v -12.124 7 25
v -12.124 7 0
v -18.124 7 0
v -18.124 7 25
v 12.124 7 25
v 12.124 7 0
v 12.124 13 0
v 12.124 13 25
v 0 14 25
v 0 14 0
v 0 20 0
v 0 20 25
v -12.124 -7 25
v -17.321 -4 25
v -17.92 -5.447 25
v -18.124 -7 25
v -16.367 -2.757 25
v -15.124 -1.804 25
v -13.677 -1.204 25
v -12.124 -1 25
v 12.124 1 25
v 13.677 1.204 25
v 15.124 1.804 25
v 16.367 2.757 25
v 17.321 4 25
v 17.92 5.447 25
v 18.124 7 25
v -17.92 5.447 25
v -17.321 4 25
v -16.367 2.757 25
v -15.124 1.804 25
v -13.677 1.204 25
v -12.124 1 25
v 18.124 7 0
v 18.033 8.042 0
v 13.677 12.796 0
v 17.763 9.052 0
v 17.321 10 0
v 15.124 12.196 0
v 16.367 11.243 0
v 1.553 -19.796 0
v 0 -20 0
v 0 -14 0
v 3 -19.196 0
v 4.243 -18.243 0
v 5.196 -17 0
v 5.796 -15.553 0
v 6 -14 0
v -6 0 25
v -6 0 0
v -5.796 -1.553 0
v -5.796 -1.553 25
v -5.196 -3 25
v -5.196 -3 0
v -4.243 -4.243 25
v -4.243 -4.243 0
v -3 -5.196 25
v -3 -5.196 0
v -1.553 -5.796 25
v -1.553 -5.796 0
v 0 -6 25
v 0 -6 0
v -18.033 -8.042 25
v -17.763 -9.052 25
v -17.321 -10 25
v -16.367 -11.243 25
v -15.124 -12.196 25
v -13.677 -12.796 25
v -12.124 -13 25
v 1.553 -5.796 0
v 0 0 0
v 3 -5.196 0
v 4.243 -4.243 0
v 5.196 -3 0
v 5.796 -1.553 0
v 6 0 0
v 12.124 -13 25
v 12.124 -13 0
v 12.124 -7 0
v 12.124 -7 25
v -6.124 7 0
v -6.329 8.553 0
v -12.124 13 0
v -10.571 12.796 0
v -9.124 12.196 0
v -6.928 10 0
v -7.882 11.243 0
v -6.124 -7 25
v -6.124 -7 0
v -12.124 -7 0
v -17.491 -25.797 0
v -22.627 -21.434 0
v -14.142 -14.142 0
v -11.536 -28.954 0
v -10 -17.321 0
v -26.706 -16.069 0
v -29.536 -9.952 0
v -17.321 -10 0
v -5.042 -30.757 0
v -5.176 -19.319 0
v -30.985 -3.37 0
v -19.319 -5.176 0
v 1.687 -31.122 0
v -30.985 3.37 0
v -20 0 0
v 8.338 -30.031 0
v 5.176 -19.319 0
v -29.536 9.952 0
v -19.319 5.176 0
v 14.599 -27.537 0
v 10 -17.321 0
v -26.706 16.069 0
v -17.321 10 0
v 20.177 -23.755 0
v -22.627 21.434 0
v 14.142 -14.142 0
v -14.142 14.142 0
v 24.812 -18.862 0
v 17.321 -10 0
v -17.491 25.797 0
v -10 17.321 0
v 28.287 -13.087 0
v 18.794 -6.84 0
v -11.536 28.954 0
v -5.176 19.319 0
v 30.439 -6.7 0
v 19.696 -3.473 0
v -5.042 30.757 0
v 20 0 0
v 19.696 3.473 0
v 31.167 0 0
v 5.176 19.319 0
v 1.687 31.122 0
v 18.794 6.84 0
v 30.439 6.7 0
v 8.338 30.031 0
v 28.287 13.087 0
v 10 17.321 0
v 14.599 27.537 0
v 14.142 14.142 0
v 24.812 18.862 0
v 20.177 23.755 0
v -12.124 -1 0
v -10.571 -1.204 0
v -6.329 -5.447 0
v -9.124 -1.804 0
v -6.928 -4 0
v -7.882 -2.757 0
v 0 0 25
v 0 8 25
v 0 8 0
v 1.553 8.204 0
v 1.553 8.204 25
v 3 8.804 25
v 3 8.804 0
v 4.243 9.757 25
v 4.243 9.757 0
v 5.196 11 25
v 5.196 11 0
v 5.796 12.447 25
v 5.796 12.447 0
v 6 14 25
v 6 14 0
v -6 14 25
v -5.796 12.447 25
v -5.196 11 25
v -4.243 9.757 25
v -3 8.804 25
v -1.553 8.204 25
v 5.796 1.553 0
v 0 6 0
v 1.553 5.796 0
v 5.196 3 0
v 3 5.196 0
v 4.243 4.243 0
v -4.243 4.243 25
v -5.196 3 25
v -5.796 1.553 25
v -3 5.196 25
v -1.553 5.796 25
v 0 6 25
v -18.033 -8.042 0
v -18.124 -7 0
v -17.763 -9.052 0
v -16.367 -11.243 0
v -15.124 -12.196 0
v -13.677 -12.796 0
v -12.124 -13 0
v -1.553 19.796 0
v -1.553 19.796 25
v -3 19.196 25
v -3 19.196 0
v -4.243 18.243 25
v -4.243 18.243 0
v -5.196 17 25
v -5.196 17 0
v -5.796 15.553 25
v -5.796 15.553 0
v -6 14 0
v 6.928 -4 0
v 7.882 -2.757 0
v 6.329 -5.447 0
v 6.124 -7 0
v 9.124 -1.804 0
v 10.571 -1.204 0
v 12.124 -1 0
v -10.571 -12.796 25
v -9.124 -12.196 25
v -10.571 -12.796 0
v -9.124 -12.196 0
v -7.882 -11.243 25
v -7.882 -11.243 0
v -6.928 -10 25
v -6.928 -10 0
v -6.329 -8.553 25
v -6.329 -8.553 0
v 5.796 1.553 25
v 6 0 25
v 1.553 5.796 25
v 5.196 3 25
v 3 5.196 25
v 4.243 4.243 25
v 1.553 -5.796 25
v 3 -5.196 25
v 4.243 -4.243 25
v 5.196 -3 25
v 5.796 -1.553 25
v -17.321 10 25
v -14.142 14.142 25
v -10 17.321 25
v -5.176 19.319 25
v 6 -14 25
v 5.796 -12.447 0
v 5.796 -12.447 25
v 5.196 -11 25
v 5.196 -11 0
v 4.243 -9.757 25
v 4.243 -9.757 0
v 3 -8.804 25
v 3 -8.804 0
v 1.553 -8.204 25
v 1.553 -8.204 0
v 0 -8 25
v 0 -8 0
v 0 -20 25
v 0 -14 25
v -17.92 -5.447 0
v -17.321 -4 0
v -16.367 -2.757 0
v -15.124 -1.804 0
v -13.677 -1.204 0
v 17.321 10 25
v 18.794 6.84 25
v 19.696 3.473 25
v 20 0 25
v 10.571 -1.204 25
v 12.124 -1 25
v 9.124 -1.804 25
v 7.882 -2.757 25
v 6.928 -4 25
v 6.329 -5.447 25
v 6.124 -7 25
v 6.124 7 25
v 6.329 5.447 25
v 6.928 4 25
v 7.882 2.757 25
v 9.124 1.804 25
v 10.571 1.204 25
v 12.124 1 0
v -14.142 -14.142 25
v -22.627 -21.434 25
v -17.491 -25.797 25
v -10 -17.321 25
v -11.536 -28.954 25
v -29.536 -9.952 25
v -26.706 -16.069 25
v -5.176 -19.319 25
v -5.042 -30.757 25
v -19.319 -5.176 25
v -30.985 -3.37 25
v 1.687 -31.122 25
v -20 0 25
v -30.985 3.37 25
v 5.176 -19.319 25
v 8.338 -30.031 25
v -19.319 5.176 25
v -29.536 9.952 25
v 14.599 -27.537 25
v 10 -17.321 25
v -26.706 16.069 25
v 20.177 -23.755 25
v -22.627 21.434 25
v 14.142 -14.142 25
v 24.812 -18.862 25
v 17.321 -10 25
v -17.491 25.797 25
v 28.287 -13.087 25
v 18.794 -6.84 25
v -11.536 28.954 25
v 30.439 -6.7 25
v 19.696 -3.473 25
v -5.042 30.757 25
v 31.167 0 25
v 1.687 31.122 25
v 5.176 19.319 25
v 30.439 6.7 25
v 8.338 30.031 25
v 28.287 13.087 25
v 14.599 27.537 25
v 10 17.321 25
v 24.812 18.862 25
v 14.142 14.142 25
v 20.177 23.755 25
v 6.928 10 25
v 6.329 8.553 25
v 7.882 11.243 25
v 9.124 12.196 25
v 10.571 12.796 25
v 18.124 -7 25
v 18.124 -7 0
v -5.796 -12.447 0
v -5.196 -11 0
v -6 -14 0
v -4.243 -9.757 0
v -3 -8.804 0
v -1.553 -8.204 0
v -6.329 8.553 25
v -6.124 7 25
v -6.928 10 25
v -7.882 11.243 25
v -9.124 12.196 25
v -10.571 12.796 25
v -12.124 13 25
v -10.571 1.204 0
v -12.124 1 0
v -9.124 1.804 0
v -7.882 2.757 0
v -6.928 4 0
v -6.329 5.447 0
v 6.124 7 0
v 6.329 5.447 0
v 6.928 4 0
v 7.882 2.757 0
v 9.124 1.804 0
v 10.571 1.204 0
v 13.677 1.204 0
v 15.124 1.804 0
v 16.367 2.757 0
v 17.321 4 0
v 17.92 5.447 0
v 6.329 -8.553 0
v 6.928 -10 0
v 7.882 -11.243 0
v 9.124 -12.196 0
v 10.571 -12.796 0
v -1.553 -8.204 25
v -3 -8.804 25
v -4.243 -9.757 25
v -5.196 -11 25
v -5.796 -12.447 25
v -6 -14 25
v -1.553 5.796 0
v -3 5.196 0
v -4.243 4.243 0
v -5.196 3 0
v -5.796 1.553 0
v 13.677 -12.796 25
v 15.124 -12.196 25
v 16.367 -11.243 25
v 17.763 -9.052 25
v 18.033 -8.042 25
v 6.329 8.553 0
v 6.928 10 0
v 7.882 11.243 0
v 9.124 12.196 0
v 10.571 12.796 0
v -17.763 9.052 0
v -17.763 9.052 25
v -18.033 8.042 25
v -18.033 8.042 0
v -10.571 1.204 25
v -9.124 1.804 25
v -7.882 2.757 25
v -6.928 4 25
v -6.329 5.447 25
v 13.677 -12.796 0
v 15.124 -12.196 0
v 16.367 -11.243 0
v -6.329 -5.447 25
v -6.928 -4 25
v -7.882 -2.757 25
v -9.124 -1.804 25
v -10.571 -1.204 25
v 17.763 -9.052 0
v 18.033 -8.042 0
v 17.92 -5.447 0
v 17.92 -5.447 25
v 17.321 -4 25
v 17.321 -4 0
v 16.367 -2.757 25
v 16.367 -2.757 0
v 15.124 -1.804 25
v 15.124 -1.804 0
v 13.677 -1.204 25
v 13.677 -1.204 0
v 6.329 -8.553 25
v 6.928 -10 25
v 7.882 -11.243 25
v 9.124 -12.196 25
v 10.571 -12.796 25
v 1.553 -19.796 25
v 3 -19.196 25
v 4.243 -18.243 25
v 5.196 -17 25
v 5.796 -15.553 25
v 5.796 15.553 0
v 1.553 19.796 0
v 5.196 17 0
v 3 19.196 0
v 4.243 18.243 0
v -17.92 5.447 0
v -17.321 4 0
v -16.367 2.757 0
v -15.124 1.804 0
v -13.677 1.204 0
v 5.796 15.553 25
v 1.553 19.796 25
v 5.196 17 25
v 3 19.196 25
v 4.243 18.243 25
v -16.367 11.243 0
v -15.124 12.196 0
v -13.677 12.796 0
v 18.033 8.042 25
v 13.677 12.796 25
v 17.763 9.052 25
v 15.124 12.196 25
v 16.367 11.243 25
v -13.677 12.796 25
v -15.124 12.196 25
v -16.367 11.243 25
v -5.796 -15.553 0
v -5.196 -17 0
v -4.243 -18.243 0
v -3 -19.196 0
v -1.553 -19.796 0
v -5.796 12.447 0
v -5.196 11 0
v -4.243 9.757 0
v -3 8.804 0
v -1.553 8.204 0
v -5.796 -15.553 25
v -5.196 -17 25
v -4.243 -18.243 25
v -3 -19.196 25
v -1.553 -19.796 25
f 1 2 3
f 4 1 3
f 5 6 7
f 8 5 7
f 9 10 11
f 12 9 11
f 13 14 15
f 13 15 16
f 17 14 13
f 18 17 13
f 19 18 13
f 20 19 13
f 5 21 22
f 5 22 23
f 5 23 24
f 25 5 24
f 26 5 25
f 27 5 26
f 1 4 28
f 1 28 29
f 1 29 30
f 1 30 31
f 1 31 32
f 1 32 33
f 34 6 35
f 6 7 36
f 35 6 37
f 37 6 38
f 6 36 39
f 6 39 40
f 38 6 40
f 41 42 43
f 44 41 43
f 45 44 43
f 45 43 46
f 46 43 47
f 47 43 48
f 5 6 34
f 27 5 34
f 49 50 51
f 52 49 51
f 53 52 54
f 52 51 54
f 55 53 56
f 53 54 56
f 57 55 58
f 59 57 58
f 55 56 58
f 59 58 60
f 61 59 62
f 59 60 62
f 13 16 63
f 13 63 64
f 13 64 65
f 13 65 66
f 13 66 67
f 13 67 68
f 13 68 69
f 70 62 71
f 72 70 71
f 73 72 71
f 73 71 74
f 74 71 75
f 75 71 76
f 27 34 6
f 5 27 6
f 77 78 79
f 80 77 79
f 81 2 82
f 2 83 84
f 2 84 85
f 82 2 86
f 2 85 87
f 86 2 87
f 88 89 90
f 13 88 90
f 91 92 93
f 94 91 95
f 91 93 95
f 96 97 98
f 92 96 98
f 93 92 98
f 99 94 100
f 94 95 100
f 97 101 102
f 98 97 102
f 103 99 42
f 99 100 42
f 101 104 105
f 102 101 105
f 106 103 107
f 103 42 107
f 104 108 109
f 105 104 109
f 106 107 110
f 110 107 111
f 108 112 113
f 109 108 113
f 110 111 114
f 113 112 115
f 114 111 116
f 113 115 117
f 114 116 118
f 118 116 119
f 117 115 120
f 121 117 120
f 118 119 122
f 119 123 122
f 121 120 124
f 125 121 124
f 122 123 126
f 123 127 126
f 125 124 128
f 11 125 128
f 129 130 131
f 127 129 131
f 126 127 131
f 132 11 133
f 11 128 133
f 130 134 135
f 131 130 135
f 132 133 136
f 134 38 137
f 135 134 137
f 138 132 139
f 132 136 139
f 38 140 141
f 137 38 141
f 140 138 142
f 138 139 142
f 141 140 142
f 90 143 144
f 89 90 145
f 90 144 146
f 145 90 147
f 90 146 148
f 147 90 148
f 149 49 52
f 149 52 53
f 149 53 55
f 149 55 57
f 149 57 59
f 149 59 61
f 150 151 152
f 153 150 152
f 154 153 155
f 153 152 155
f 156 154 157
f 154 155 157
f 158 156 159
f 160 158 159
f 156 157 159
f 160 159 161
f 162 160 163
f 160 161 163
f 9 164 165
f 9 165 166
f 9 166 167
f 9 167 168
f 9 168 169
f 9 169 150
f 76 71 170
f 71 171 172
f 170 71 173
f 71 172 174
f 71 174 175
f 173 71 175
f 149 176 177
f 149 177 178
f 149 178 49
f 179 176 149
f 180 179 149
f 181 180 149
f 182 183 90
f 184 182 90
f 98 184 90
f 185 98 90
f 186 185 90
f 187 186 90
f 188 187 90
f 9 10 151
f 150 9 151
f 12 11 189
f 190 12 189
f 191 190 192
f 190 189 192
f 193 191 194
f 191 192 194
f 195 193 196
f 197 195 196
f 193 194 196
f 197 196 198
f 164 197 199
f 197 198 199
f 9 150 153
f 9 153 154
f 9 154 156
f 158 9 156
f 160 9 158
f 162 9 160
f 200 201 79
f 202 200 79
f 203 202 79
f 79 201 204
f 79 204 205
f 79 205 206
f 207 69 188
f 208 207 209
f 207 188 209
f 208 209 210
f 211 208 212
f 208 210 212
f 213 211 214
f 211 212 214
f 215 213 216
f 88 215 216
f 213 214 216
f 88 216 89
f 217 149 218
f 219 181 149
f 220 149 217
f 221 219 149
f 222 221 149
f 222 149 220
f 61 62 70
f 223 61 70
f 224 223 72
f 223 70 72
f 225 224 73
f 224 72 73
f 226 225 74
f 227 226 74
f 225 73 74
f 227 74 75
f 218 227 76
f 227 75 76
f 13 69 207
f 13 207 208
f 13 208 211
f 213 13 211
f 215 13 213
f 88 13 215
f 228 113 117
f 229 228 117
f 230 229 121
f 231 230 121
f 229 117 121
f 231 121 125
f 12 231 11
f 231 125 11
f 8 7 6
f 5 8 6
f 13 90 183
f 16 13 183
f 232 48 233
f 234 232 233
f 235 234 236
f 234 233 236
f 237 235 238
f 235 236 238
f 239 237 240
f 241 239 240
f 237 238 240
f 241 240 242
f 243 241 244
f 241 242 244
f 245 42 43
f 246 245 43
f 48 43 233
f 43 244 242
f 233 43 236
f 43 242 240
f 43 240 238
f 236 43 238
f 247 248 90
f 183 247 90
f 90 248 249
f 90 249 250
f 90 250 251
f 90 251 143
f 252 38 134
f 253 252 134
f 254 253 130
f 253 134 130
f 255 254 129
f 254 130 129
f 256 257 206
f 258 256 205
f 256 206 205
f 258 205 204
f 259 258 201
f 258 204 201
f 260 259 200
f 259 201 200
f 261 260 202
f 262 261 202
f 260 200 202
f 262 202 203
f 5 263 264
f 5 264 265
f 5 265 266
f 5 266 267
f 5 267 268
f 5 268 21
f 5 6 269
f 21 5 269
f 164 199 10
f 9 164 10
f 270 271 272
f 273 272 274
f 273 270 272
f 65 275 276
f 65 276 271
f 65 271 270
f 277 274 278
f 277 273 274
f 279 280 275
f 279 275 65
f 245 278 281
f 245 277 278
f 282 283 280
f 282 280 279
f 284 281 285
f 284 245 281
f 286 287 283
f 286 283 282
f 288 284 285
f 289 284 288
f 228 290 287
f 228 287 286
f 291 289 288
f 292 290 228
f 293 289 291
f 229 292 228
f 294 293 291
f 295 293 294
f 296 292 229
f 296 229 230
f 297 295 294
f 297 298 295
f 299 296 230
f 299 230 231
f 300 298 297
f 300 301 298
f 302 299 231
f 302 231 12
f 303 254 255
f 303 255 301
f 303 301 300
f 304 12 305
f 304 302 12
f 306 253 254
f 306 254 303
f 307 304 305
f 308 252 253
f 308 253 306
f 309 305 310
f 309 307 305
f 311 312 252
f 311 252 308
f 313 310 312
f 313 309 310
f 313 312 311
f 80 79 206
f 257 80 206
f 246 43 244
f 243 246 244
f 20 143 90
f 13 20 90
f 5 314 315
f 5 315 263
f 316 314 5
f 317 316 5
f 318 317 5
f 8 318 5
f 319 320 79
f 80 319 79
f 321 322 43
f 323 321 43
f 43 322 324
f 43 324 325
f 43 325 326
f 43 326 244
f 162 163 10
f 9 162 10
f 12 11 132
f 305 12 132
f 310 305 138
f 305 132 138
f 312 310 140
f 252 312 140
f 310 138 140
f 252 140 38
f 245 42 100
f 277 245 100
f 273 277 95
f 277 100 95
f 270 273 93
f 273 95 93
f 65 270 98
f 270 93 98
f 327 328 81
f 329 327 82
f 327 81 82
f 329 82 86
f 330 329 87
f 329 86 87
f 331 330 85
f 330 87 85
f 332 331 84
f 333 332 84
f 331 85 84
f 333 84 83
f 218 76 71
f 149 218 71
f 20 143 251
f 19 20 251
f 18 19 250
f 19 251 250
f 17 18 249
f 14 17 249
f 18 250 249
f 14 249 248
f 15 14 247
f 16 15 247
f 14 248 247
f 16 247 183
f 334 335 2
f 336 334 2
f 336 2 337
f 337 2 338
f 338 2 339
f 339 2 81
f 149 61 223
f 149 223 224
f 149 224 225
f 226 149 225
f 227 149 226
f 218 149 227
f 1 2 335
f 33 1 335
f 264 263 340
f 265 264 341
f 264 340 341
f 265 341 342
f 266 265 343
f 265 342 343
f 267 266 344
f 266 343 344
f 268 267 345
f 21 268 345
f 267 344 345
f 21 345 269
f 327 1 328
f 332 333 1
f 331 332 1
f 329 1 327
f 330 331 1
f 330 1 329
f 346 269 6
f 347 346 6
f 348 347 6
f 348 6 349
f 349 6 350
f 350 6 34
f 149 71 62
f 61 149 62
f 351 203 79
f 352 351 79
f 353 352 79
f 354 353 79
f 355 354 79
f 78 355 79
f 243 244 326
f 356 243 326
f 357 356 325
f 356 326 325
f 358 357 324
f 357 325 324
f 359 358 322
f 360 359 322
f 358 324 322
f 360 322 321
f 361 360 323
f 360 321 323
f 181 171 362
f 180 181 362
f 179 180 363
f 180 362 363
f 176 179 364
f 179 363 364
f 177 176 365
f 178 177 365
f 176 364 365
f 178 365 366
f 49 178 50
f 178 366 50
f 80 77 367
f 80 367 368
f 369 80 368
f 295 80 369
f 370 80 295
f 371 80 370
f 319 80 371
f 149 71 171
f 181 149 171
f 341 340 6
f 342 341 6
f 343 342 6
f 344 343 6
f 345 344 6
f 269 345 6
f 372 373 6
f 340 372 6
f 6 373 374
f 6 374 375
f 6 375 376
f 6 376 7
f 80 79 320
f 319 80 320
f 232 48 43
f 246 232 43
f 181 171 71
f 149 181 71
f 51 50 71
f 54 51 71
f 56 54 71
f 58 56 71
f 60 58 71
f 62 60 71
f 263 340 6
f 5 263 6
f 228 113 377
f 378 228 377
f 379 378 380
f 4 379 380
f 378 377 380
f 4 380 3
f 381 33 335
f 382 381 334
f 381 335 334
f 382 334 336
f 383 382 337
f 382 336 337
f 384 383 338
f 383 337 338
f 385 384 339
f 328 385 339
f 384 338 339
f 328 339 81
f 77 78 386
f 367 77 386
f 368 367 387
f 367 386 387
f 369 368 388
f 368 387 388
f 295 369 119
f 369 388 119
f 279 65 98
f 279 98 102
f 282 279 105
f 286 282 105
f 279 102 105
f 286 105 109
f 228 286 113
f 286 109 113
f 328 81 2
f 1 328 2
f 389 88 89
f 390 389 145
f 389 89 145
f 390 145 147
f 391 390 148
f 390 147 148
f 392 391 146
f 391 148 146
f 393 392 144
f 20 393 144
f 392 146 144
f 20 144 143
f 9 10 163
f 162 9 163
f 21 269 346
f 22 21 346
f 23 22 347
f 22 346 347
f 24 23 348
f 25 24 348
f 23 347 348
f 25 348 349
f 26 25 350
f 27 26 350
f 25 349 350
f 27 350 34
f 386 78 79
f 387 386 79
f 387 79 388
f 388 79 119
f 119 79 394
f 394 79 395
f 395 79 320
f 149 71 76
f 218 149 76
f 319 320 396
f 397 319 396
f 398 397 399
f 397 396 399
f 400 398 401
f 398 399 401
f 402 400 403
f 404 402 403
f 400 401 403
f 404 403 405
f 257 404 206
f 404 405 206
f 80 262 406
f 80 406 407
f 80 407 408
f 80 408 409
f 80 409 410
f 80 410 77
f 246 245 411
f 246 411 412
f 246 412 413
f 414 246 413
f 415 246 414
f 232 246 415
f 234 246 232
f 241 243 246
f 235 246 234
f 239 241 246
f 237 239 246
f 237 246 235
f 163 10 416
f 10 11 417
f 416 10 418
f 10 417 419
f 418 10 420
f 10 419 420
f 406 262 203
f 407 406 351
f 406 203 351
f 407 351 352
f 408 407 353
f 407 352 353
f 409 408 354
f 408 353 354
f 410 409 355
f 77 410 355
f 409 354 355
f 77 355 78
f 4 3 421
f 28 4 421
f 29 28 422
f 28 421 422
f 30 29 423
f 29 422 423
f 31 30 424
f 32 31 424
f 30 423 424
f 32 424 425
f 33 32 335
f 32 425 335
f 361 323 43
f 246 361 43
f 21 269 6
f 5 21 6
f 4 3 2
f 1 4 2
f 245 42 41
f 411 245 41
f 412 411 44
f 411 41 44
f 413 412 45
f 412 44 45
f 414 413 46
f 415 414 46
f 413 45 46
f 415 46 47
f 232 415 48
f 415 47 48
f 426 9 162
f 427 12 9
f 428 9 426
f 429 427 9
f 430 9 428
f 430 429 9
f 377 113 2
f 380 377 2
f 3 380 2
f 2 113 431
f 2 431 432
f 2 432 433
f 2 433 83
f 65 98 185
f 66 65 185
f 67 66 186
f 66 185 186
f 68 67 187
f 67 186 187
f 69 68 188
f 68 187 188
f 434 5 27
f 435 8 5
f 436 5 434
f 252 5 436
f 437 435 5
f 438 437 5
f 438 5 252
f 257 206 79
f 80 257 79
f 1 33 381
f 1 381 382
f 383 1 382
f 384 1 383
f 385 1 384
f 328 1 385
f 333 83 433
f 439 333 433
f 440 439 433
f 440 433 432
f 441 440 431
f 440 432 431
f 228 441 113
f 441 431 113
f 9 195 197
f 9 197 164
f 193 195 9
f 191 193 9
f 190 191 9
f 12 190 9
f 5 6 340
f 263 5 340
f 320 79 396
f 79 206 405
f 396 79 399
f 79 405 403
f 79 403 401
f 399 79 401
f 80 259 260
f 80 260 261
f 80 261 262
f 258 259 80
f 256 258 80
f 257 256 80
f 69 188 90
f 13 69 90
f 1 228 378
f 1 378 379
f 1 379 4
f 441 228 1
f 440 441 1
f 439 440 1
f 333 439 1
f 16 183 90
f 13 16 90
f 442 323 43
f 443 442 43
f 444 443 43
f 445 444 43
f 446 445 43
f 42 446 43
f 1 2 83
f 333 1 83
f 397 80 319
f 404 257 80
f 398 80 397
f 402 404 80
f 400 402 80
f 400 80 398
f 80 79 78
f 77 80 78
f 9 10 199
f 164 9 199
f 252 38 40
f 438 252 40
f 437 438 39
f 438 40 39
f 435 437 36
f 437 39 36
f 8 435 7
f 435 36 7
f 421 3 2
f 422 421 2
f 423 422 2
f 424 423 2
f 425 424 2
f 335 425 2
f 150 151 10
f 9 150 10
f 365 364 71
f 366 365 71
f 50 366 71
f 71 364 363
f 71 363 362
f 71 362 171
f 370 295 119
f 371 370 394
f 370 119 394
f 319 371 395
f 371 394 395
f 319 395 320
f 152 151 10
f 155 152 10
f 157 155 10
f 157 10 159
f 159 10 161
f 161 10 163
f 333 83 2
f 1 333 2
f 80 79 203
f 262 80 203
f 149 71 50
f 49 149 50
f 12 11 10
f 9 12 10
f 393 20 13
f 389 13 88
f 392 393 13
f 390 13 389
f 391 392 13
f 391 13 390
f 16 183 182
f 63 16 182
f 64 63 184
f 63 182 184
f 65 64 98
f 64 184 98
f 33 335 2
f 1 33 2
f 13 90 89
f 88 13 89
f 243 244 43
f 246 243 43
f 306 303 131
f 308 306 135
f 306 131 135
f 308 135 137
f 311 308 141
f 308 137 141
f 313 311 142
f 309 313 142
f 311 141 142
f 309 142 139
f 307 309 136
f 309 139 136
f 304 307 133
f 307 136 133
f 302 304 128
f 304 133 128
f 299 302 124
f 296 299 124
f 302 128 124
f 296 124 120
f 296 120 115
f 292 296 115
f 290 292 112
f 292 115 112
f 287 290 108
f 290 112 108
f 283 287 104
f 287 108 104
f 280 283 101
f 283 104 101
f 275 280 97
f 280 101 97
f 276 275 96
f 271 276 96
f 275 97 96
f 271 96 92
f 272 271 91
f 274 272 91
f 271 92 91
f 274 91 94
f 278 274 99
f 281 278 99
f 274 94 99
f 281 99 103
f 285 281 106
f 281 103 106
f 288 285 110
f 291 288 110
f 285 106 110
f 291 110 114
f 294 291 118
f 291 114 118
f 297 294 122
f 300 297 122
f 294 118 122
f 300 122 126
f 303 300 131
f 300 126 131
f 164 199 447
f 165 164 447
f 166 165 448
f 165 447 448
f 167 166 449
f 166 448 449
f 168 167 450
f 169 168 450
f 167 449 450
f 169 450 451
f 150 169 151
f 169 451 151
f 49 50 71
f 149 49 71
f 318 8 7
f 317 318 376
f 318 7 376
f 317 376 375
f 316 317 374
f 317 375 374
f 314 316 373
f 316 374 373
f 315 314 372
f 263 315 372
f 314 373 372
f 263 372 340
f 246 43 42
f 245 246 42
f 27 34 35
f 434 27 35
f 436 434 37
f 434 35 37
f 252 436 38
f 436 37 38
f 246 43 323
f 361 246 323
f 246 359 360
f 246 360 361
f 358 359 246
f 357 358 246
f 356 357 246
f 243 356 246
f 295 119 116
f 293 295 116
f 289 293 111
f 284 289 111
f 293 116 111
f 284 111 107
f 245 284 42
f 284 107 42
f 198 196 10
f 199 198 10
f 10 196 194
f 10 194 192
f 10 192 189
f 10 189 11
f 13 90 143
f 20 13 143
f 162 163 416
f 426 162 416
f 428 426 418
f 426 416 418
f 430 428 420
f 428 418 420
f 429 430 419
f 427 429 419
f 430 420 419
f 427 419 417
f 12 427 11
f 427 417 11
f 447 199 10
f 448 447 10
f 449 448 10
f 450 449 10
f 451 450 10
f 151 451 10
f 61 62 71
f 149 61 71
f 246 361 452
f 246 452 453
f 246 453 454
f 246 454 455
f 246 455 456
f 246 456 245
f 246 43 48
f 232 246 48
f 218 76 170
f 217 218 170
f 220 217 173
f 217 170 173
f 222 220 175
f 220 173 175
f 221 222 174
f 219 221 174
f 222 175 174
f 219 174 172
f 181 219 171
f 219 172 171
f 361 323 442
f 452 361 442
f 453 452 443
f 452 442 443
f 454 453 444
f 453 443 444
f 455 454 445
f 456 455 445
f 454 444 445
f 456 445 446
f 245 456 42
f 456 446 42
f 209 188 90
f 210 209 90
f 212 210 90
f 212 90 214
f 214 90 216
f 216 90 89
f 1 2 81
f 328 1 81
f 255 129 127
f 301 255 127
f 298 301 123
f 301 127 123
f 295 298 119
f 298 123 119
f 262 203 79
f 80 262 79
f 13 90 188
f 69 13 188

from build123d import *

# Parameters (mm, degrees)
F1_DEPTH = 25
F2_DEPTH = 25
F0_R     = 31.1674729763
F3_DEPTH = 25


with BuildPart() as f1:
    # F0 (on Top) → F1 (new body)
    with BuildSketch(Plane.XY):
        with BuildLine():
            Line((0, -14), (0, -20))
            ThreePointArc((0, -20), (4.2426406871, -18.2426406871), (6, -14))
            Line((6, -14), (0, -14))
        make_face()
    extrude(amount=F1_DEPTH)


with BuildPart() as f1b:
    # F0 (on Top) → F1, piece 2 (new body)
    with BuildSketch(Plane.XY):
        with BuildLine():
            ThreePointArc((0, -8), (-4.2426406871, -9.7573593129), (-6, -14))
            Line((-6, -14), (0, -14))
            Line((0, -14), (0, -8))
        make_face()
    extrude(amount=F1_DEPTH)


with BuildPart() as f1c:
    # F0 (on Top) → F1, piece 3 (new body)
    with BuildSketch(Plane.XY):
        with BuildLine():
            ThreePointArc((-12.124355653, 1), (-7.8817149659, 2.7573593129), (-6.124355653, 7))
            Line((-6.124355653, 7), (-12.124355653, 7))
            Line((-12.124355653, 7), (-12.124355653, 1))
        make_face()
    extrude(amount=F1_DEPTH)


with BuildPart() as f1d:
    # F0 (on Top) → F1, piece 4 (new body)
    with BuildSketch(Plane.XY):
        with BuildLine():
            Line((0, 0), (0, 6))
            ThreePointArc((0, 6), (-4.2426406871, 4.2426406871), (-6, 0))
            Line((-6, 0), (0, 0))
        make_face()
    extrude(amount=F1_DEPTH)


with BuildPart() as f1e:
    # F0 (on Top) → F1, piece 5 (new body)
    with BuildSketch(Plane.XY):
        with BuildLine():
            ThreePointArc((0, -6), (4.2426406871, -4.2426406871), (6, 0))
            Line((6, 0), (0, 0))
            Line((0, 0), (0, -6))
        make_face()
    extrude(amount=F1_DEPTH)


with BuildPart() as f1f:
    # F0 (on Top) → F1, piece 6 (new body)
    with BuildSketch(Plane.XY):
        with BuildLine():
            Line((0, 14), (0, 20))
            ThreePointArc((0, 20), (-4.2426406871, 18.2426406871), (-6, 14))
            Line((-6, 14), (0, 14))
        make_face()
    extrude(amount=F1_DEPTH)


with BuildPart() as f1g:
    # F0 (on Top) → F1, piece 7 (new body)
    with BuildSketch(Plane.XY):
        with BuildLine():
            ThreePointArc((0, 8), (4.2426406871, 9.7573593129), (6, 14))
            Line((6, 14), (0, 14))
            Line((0, 14), (0, 8))
        make_face()
    extrude(amount=F1_DEPTH)


with BuildPart() as f1h:
    # F0 (on Top) → F1, piece 8 (new body)
    with BuildSketch(Plane.XY):
        with BuildLine():
            ThreePointArc((-12.124355653, 13), (-15.1243555847, 12.1961524621), (-17.3205079969, 10.0000001365))
            ThreePointArc((-17.3205079969, 10.0000001365), (-17.9199105903, 8.5529143467), (-18.124355653, 7))
            Line((-18.124355653, 7), (-12.124355653, 7))
            Line((-12.124355653, 7), (-12.124355653, 13))
        make_face()
    extrude(amount=F1_DEPTH)


with BuildPart() as f1i:
    # F0 (on Top) → F1, piece 9 (new body)
    with BuildSketch(Plane.XY):
        with BuildLine():
            Line((-12.124355653, -7), (-12.124355653, -13))
            ThreePointArc((-12.124355653, -13), (-7.8817149659, -11.2426406871), (-6.124355653, -7))
            Line((-6.124355653, -7), (-12.124355653, -7))
        make_face()
    extrude(amount=F1_DEPTH)


with BuildPart() as f1j:
    # F0 (on Top) → F1, piece 10 (new body)
    with BuildSketch(Plane.XY):
        with BuildLine():
            ThreePointArc((-12.124355653, -1), (-16.3669963401, -2.7573593129), (-18.124355653, -7))
            Line((-18.124355653, -7), (-12.124355653, -7))
            Line((-12.124355653, -7), (-12.124355653, -1))
        make_face()
    extrude(amount=F1_DEPTH)


with BuildPart() as f1k:
    # F0 (on Top) → F1, piece 11 (new body)
    with BuildSketch(Plane.XY):
        with BuildLine():
            ThreePointArc((12.124355653, 1), (16.3669963401, 2.7573593129), (18.124355653, 7))
            Line((18.124355653, 7), (12.124355653, 7))
            Line((12.124355653, 7), (12.124355653, 1))
        make_face()
    extrude(amount=F1_DEPTH)


with BuildPart() as f1l:
    # F0 (on Top) → F1, piece 12 (new body)
    with BuildSketch(Plane.XY):
        with BuildLine():
            ThreePointArc((12.124355653, -13), (15.1243557101, -12.1961523897), (17.3205081416, -9.9999998858))
            ThreePointArc((17.3205081416, -9.9999998858), (17.9199106278, -8.5529142069), (18.124355653, -7))
            Line((18.124355653, -7), (12.124355653, -7))
            Line((12.124355653, -7), (12.124355653, -13))
        make_face()
    extrude(amount=F1_DEPTH)


with BuildPart() as f1m:
    # F0 (on Top) → F1, piece 13 (new body)
    with BuildSketch(Plane.XY):
        with BuildLine():
            ThreePointArc((12.124355653, -1), (7.8817149659, -2.7573593129), (6.124355653, -7))
            Line((6.124355653, -7), (12.124355653, -7))
            Line((12.124355653, -7), (12.124355653, -1))
        make_face()
    extrude(amount=F1_DEPTH)


with BuildPart() as f1n:
    # F0 (on Top) → F1, piece 14 (new body)
    with BuildSketch(Plane.XY):
        with BuildLine():
            Line((12.124355653, 7), (12.124355653, 13))
            ThreePointArc((12.124355653, 13), (7.8817149659, 11.2426406871), (6.124355653, 7))
            Line((6.124355653, 7), (12.124355653, 7))
        make_face()
    extrude(amount=F1_DEPTH)


with BuildPart() as f2:
    # F0 (on Top) → F2 (new body)
    with BuildSketch(Plane.XY):
        with BuildLine():
            Line((-12.124355653, 7), (-18.124355653, 7))
            ThreePointArc((-18.124355653, 7), (-16.3669963401, 2.7573593129), (-12.124355653, 1))
            Line((-12.124355653, 1), (-12.124355653, 7))
        make_face()
    extrude(amount=F2_DEPTH)


with BuildPart() as f2b:
    # F0 (on Top) → F2, piece 2 (new body)
    with BuildSketch(Plane.XY):
        with BuildLine():
            ThreePointArc((-6.124355653, 7), (-7.8817149659, 11.2426406871), (-12.124355653, 13))
            Line((-12.124355653, 13), (-12.124355653, 7))
            Line((-12.124355653, 7), (-6.124355653, 7))
        make_face()
    extrude(amount=F2_DEPTH)


with BuildPart() as f2c:
    # F0 (on Top) → F2, piece 3 (new body)
    with BuildSketch(Plane.XY):
        with BuildLine():
            ThreePointArc((6, 14), (4.2426406871, 18.2426406871), (0, 20))
            Line((0, 20), (0, 14))
            Line((0, 14), (6, 14))
        make_face()
    extrude(amount=F2_DEPTH)


with BuildPart() as f2d:
    # F0 (on Top) → F2, piece 4 (new body)
    with BuildSketch(Plane.XY):
        with BuildLine():
            Line((0, 14), (-6, 14))
            ThreePointArc((-6, 14), (-4.2426406871, 9.7573593129), (0, 8))
            Line((0, 8), (0, 14))
        make_face()
    extrude(amount=F2_DEPTH)


with BuildPart() as f2e:
    # F0 (on Top) → F2, piece 5 (new body)
    with BuildSketch(Plane.XY):
        with BuildLine():
            Line((0, 0), (6, 0))
            ThreePointArc((6, 0), (4.2426406871, 4.2426406871), (0, 6))
            Line((0, 6), (0, 0))
        make_face()
    extrude(amount=F2_DEPTH)


with BuildPart() as f2f:
    # F0 (on Top) → F2, piece 6 (new body)
    with BuildSketch(Plane.XY):
        with BuildLine():
            ThreePointArc((-6, 0), (-4.2426406871, -4.2426406871), (0, -6))
            Line((0, -6), (0, 0))
            Line((0, 0), (-6, 0))
        make_face()
    extrude(amount=F2_DEPTH)


with BuildPart() as f2g:
    # F0 (on Top) → F2, piece 7 (new body)
    with BuildSketch(Plane.XY):
        with BuildLine():
            ThreePointArc((18.124355653, 7), (17.9199106302, 8.5529141978), (17.3205081511, 9.9999998694))
            ThreePointArc((17.3205081511, 9.9999998694), (15.1243557183, 12.196152385), (12.124355653, 13))
            Line((12.124355653, 13), (12.124355653, 7))
            Line((12.124355653, 7), (18.124355653, 7))
        make_face()
    extrude(amount=F2_DEPTH)


with BuildPart() as f2h:
    # F0 (on Top) → F2, piece 8 (new body)
    with BuildSketch(Plane.XY):
        with BuildLine():
            ThreePointArc((6.124355653, -7), (7.8817149659, -11.2426406871), (12.124355653, -13))
            Line((12.124355653, -13), (12.124355653, -7))
            Line((12.124355653, -7), (6.124355653, -7))
        make_face()
    extrude(amount=F2_DEPTH)


with BuildPart() as f2i:
    # F0 (on Top) → F2, piece 9 (new body)
    with BuildSketch(Plane.XY):
        with BuildLine():
            Line((12.124355653, -7), (18.124355653, -7))
            ThreePointArc((18.124355653, -7), (16.3669963401, -2.7573593129), (12.124355653, -1))
            Line((12.124355653, -1), (12.124355653, -7))
        make_face()
    extrude(amount=F2_DEPTH)


with BuildPart() as f2j:
    # F0 (on Top) → F2, piece 10 (new body)
    with BuildSketch(Plane.XY):
        with BuildLine():
            Line((0, -14), (6, -14))
            ThreePointArc((6, -14), (4.2426406871, -9.7573593129), (0, -8))
            Line((0, -8), (0, -14))
        make_face()
    extrude(amount=F2_DEPTH)


with BuildPart() as f2k:
    # F0 (on Top) → F2, piece 11 (new body)
    with BuildSketch(Plane.XY):
        with BuildLine():
            ThreePointArc((-6, -14), (-4.2426406871, -18.2426406871), (0, -20))
            Line((0, -20), (0, -14))
            Line((0, -14), (-6, -14))
        make_face()
    extrude(amount=F2_DEPTH)


with BuildPart() as f2l:
    # F0 (on Top) → F2, piece 12 (new body)
    with BuildSketch(Plane.XY):
        with BuildLine():
            ThreePointArc((-18.124355653, -7), (-17.9199106445, -8.5529141443), (-17.3205082064, -9.9999997736))
            ThreePointArc((-17.3205082064, -9.9999997736), (-15.1243557662, -12.1961523573), (-12.124355653, -13))
            Line((-12.124355653, -13), (-12.124355653, -7))
            Line((-12.124355653, -7), (-18.124355653, -7))
        make_face()
    extrude(amount=F2_DEPTH)


with BuildPart() as f2m:
    # F0 (on Top) → F2, piece 13 (new body)
    with BuildSketch(Plane.XY):
        with BuildLine():
            ThreePointArc((-6.124355653, -7), (-7.8817149659, -2.7573593129), (-12.124355653, -1))
            Line((-12.124355653, -1), (-12.124355653, -7))
            Line((-12.124355653, -7), (-6.124355653, -7))
        make_face()
    extrude(amount=F2_DEPTH)


with BuildPart() as f2n:
    # F0 (on Top) → F2, piece 14 (new body)
    with BuildSketch(Plane.XY):
        with BuildLine():
            ThreePointArc((6.124355653, 7), (7.8817149659, 2.7573593129), (12.124355653, 1))
            Line((12.124355653, 1), (12.124355653, 7))
            Line((12.124355653, 7), (6.124355653, 7))
        make_face()
    extrude(amount=F2_DEPTH)


with BuildPart() as f3:
    # F0 (on Top) → F3 (new body)
    with BuildSketch(Plane.XY):
        Circle(F0_R)
        with BuildLine():
            ThreePointArc((17.3205081511, 9.9999998694), (19.3185165453, 5.1763808292), (20, 0))
            ThreePointArc((20, 0), (19.3185165429, -5.1763808383), (17.3205081416, -9.9999998858))
            ThreePointArc((17.3205081416, -9.9999998858), (10.0000000571, -17.3205080427), (0, -20))
            ThreePointArc((0, -20), (-10.0000001132, -17.3205080103), (-17.3205082064, -9.9999997736))
            ThreePointArc((-17.3205082064, -9.9999997736), (-20, 2.095e-07), (-17.3205079969, 10.0000001365))
            ThreePointArc((-17.3205079969, 10.0000001365), (-9.9999999318, 17.3205081151), (0, 20))
            ThreePointArc((0, 20), (10.0000000653, 17.320508038), (17.3205081511, 9.9999998694))
        make_face(mode=Mode.SUBTRACT)
    extrude(amount=F3_DEPTH)


solid = Compound([f1.part, f1b.part, f1c.part, f1d.part, f1e.part, f1f.part, f1g.part, f1h.part, f1i.part, f1j.part, f1k.part, f1l.part, f1m.part, f1n.part, f2.part, f2b.part, f2c.part, f2d.part, f2e.part, f2f.part, f2g.part, f2h.part, f2i.part, f2j.part, f2k.part, f2l.part, f2m.part, f2n.part, f3.part])
